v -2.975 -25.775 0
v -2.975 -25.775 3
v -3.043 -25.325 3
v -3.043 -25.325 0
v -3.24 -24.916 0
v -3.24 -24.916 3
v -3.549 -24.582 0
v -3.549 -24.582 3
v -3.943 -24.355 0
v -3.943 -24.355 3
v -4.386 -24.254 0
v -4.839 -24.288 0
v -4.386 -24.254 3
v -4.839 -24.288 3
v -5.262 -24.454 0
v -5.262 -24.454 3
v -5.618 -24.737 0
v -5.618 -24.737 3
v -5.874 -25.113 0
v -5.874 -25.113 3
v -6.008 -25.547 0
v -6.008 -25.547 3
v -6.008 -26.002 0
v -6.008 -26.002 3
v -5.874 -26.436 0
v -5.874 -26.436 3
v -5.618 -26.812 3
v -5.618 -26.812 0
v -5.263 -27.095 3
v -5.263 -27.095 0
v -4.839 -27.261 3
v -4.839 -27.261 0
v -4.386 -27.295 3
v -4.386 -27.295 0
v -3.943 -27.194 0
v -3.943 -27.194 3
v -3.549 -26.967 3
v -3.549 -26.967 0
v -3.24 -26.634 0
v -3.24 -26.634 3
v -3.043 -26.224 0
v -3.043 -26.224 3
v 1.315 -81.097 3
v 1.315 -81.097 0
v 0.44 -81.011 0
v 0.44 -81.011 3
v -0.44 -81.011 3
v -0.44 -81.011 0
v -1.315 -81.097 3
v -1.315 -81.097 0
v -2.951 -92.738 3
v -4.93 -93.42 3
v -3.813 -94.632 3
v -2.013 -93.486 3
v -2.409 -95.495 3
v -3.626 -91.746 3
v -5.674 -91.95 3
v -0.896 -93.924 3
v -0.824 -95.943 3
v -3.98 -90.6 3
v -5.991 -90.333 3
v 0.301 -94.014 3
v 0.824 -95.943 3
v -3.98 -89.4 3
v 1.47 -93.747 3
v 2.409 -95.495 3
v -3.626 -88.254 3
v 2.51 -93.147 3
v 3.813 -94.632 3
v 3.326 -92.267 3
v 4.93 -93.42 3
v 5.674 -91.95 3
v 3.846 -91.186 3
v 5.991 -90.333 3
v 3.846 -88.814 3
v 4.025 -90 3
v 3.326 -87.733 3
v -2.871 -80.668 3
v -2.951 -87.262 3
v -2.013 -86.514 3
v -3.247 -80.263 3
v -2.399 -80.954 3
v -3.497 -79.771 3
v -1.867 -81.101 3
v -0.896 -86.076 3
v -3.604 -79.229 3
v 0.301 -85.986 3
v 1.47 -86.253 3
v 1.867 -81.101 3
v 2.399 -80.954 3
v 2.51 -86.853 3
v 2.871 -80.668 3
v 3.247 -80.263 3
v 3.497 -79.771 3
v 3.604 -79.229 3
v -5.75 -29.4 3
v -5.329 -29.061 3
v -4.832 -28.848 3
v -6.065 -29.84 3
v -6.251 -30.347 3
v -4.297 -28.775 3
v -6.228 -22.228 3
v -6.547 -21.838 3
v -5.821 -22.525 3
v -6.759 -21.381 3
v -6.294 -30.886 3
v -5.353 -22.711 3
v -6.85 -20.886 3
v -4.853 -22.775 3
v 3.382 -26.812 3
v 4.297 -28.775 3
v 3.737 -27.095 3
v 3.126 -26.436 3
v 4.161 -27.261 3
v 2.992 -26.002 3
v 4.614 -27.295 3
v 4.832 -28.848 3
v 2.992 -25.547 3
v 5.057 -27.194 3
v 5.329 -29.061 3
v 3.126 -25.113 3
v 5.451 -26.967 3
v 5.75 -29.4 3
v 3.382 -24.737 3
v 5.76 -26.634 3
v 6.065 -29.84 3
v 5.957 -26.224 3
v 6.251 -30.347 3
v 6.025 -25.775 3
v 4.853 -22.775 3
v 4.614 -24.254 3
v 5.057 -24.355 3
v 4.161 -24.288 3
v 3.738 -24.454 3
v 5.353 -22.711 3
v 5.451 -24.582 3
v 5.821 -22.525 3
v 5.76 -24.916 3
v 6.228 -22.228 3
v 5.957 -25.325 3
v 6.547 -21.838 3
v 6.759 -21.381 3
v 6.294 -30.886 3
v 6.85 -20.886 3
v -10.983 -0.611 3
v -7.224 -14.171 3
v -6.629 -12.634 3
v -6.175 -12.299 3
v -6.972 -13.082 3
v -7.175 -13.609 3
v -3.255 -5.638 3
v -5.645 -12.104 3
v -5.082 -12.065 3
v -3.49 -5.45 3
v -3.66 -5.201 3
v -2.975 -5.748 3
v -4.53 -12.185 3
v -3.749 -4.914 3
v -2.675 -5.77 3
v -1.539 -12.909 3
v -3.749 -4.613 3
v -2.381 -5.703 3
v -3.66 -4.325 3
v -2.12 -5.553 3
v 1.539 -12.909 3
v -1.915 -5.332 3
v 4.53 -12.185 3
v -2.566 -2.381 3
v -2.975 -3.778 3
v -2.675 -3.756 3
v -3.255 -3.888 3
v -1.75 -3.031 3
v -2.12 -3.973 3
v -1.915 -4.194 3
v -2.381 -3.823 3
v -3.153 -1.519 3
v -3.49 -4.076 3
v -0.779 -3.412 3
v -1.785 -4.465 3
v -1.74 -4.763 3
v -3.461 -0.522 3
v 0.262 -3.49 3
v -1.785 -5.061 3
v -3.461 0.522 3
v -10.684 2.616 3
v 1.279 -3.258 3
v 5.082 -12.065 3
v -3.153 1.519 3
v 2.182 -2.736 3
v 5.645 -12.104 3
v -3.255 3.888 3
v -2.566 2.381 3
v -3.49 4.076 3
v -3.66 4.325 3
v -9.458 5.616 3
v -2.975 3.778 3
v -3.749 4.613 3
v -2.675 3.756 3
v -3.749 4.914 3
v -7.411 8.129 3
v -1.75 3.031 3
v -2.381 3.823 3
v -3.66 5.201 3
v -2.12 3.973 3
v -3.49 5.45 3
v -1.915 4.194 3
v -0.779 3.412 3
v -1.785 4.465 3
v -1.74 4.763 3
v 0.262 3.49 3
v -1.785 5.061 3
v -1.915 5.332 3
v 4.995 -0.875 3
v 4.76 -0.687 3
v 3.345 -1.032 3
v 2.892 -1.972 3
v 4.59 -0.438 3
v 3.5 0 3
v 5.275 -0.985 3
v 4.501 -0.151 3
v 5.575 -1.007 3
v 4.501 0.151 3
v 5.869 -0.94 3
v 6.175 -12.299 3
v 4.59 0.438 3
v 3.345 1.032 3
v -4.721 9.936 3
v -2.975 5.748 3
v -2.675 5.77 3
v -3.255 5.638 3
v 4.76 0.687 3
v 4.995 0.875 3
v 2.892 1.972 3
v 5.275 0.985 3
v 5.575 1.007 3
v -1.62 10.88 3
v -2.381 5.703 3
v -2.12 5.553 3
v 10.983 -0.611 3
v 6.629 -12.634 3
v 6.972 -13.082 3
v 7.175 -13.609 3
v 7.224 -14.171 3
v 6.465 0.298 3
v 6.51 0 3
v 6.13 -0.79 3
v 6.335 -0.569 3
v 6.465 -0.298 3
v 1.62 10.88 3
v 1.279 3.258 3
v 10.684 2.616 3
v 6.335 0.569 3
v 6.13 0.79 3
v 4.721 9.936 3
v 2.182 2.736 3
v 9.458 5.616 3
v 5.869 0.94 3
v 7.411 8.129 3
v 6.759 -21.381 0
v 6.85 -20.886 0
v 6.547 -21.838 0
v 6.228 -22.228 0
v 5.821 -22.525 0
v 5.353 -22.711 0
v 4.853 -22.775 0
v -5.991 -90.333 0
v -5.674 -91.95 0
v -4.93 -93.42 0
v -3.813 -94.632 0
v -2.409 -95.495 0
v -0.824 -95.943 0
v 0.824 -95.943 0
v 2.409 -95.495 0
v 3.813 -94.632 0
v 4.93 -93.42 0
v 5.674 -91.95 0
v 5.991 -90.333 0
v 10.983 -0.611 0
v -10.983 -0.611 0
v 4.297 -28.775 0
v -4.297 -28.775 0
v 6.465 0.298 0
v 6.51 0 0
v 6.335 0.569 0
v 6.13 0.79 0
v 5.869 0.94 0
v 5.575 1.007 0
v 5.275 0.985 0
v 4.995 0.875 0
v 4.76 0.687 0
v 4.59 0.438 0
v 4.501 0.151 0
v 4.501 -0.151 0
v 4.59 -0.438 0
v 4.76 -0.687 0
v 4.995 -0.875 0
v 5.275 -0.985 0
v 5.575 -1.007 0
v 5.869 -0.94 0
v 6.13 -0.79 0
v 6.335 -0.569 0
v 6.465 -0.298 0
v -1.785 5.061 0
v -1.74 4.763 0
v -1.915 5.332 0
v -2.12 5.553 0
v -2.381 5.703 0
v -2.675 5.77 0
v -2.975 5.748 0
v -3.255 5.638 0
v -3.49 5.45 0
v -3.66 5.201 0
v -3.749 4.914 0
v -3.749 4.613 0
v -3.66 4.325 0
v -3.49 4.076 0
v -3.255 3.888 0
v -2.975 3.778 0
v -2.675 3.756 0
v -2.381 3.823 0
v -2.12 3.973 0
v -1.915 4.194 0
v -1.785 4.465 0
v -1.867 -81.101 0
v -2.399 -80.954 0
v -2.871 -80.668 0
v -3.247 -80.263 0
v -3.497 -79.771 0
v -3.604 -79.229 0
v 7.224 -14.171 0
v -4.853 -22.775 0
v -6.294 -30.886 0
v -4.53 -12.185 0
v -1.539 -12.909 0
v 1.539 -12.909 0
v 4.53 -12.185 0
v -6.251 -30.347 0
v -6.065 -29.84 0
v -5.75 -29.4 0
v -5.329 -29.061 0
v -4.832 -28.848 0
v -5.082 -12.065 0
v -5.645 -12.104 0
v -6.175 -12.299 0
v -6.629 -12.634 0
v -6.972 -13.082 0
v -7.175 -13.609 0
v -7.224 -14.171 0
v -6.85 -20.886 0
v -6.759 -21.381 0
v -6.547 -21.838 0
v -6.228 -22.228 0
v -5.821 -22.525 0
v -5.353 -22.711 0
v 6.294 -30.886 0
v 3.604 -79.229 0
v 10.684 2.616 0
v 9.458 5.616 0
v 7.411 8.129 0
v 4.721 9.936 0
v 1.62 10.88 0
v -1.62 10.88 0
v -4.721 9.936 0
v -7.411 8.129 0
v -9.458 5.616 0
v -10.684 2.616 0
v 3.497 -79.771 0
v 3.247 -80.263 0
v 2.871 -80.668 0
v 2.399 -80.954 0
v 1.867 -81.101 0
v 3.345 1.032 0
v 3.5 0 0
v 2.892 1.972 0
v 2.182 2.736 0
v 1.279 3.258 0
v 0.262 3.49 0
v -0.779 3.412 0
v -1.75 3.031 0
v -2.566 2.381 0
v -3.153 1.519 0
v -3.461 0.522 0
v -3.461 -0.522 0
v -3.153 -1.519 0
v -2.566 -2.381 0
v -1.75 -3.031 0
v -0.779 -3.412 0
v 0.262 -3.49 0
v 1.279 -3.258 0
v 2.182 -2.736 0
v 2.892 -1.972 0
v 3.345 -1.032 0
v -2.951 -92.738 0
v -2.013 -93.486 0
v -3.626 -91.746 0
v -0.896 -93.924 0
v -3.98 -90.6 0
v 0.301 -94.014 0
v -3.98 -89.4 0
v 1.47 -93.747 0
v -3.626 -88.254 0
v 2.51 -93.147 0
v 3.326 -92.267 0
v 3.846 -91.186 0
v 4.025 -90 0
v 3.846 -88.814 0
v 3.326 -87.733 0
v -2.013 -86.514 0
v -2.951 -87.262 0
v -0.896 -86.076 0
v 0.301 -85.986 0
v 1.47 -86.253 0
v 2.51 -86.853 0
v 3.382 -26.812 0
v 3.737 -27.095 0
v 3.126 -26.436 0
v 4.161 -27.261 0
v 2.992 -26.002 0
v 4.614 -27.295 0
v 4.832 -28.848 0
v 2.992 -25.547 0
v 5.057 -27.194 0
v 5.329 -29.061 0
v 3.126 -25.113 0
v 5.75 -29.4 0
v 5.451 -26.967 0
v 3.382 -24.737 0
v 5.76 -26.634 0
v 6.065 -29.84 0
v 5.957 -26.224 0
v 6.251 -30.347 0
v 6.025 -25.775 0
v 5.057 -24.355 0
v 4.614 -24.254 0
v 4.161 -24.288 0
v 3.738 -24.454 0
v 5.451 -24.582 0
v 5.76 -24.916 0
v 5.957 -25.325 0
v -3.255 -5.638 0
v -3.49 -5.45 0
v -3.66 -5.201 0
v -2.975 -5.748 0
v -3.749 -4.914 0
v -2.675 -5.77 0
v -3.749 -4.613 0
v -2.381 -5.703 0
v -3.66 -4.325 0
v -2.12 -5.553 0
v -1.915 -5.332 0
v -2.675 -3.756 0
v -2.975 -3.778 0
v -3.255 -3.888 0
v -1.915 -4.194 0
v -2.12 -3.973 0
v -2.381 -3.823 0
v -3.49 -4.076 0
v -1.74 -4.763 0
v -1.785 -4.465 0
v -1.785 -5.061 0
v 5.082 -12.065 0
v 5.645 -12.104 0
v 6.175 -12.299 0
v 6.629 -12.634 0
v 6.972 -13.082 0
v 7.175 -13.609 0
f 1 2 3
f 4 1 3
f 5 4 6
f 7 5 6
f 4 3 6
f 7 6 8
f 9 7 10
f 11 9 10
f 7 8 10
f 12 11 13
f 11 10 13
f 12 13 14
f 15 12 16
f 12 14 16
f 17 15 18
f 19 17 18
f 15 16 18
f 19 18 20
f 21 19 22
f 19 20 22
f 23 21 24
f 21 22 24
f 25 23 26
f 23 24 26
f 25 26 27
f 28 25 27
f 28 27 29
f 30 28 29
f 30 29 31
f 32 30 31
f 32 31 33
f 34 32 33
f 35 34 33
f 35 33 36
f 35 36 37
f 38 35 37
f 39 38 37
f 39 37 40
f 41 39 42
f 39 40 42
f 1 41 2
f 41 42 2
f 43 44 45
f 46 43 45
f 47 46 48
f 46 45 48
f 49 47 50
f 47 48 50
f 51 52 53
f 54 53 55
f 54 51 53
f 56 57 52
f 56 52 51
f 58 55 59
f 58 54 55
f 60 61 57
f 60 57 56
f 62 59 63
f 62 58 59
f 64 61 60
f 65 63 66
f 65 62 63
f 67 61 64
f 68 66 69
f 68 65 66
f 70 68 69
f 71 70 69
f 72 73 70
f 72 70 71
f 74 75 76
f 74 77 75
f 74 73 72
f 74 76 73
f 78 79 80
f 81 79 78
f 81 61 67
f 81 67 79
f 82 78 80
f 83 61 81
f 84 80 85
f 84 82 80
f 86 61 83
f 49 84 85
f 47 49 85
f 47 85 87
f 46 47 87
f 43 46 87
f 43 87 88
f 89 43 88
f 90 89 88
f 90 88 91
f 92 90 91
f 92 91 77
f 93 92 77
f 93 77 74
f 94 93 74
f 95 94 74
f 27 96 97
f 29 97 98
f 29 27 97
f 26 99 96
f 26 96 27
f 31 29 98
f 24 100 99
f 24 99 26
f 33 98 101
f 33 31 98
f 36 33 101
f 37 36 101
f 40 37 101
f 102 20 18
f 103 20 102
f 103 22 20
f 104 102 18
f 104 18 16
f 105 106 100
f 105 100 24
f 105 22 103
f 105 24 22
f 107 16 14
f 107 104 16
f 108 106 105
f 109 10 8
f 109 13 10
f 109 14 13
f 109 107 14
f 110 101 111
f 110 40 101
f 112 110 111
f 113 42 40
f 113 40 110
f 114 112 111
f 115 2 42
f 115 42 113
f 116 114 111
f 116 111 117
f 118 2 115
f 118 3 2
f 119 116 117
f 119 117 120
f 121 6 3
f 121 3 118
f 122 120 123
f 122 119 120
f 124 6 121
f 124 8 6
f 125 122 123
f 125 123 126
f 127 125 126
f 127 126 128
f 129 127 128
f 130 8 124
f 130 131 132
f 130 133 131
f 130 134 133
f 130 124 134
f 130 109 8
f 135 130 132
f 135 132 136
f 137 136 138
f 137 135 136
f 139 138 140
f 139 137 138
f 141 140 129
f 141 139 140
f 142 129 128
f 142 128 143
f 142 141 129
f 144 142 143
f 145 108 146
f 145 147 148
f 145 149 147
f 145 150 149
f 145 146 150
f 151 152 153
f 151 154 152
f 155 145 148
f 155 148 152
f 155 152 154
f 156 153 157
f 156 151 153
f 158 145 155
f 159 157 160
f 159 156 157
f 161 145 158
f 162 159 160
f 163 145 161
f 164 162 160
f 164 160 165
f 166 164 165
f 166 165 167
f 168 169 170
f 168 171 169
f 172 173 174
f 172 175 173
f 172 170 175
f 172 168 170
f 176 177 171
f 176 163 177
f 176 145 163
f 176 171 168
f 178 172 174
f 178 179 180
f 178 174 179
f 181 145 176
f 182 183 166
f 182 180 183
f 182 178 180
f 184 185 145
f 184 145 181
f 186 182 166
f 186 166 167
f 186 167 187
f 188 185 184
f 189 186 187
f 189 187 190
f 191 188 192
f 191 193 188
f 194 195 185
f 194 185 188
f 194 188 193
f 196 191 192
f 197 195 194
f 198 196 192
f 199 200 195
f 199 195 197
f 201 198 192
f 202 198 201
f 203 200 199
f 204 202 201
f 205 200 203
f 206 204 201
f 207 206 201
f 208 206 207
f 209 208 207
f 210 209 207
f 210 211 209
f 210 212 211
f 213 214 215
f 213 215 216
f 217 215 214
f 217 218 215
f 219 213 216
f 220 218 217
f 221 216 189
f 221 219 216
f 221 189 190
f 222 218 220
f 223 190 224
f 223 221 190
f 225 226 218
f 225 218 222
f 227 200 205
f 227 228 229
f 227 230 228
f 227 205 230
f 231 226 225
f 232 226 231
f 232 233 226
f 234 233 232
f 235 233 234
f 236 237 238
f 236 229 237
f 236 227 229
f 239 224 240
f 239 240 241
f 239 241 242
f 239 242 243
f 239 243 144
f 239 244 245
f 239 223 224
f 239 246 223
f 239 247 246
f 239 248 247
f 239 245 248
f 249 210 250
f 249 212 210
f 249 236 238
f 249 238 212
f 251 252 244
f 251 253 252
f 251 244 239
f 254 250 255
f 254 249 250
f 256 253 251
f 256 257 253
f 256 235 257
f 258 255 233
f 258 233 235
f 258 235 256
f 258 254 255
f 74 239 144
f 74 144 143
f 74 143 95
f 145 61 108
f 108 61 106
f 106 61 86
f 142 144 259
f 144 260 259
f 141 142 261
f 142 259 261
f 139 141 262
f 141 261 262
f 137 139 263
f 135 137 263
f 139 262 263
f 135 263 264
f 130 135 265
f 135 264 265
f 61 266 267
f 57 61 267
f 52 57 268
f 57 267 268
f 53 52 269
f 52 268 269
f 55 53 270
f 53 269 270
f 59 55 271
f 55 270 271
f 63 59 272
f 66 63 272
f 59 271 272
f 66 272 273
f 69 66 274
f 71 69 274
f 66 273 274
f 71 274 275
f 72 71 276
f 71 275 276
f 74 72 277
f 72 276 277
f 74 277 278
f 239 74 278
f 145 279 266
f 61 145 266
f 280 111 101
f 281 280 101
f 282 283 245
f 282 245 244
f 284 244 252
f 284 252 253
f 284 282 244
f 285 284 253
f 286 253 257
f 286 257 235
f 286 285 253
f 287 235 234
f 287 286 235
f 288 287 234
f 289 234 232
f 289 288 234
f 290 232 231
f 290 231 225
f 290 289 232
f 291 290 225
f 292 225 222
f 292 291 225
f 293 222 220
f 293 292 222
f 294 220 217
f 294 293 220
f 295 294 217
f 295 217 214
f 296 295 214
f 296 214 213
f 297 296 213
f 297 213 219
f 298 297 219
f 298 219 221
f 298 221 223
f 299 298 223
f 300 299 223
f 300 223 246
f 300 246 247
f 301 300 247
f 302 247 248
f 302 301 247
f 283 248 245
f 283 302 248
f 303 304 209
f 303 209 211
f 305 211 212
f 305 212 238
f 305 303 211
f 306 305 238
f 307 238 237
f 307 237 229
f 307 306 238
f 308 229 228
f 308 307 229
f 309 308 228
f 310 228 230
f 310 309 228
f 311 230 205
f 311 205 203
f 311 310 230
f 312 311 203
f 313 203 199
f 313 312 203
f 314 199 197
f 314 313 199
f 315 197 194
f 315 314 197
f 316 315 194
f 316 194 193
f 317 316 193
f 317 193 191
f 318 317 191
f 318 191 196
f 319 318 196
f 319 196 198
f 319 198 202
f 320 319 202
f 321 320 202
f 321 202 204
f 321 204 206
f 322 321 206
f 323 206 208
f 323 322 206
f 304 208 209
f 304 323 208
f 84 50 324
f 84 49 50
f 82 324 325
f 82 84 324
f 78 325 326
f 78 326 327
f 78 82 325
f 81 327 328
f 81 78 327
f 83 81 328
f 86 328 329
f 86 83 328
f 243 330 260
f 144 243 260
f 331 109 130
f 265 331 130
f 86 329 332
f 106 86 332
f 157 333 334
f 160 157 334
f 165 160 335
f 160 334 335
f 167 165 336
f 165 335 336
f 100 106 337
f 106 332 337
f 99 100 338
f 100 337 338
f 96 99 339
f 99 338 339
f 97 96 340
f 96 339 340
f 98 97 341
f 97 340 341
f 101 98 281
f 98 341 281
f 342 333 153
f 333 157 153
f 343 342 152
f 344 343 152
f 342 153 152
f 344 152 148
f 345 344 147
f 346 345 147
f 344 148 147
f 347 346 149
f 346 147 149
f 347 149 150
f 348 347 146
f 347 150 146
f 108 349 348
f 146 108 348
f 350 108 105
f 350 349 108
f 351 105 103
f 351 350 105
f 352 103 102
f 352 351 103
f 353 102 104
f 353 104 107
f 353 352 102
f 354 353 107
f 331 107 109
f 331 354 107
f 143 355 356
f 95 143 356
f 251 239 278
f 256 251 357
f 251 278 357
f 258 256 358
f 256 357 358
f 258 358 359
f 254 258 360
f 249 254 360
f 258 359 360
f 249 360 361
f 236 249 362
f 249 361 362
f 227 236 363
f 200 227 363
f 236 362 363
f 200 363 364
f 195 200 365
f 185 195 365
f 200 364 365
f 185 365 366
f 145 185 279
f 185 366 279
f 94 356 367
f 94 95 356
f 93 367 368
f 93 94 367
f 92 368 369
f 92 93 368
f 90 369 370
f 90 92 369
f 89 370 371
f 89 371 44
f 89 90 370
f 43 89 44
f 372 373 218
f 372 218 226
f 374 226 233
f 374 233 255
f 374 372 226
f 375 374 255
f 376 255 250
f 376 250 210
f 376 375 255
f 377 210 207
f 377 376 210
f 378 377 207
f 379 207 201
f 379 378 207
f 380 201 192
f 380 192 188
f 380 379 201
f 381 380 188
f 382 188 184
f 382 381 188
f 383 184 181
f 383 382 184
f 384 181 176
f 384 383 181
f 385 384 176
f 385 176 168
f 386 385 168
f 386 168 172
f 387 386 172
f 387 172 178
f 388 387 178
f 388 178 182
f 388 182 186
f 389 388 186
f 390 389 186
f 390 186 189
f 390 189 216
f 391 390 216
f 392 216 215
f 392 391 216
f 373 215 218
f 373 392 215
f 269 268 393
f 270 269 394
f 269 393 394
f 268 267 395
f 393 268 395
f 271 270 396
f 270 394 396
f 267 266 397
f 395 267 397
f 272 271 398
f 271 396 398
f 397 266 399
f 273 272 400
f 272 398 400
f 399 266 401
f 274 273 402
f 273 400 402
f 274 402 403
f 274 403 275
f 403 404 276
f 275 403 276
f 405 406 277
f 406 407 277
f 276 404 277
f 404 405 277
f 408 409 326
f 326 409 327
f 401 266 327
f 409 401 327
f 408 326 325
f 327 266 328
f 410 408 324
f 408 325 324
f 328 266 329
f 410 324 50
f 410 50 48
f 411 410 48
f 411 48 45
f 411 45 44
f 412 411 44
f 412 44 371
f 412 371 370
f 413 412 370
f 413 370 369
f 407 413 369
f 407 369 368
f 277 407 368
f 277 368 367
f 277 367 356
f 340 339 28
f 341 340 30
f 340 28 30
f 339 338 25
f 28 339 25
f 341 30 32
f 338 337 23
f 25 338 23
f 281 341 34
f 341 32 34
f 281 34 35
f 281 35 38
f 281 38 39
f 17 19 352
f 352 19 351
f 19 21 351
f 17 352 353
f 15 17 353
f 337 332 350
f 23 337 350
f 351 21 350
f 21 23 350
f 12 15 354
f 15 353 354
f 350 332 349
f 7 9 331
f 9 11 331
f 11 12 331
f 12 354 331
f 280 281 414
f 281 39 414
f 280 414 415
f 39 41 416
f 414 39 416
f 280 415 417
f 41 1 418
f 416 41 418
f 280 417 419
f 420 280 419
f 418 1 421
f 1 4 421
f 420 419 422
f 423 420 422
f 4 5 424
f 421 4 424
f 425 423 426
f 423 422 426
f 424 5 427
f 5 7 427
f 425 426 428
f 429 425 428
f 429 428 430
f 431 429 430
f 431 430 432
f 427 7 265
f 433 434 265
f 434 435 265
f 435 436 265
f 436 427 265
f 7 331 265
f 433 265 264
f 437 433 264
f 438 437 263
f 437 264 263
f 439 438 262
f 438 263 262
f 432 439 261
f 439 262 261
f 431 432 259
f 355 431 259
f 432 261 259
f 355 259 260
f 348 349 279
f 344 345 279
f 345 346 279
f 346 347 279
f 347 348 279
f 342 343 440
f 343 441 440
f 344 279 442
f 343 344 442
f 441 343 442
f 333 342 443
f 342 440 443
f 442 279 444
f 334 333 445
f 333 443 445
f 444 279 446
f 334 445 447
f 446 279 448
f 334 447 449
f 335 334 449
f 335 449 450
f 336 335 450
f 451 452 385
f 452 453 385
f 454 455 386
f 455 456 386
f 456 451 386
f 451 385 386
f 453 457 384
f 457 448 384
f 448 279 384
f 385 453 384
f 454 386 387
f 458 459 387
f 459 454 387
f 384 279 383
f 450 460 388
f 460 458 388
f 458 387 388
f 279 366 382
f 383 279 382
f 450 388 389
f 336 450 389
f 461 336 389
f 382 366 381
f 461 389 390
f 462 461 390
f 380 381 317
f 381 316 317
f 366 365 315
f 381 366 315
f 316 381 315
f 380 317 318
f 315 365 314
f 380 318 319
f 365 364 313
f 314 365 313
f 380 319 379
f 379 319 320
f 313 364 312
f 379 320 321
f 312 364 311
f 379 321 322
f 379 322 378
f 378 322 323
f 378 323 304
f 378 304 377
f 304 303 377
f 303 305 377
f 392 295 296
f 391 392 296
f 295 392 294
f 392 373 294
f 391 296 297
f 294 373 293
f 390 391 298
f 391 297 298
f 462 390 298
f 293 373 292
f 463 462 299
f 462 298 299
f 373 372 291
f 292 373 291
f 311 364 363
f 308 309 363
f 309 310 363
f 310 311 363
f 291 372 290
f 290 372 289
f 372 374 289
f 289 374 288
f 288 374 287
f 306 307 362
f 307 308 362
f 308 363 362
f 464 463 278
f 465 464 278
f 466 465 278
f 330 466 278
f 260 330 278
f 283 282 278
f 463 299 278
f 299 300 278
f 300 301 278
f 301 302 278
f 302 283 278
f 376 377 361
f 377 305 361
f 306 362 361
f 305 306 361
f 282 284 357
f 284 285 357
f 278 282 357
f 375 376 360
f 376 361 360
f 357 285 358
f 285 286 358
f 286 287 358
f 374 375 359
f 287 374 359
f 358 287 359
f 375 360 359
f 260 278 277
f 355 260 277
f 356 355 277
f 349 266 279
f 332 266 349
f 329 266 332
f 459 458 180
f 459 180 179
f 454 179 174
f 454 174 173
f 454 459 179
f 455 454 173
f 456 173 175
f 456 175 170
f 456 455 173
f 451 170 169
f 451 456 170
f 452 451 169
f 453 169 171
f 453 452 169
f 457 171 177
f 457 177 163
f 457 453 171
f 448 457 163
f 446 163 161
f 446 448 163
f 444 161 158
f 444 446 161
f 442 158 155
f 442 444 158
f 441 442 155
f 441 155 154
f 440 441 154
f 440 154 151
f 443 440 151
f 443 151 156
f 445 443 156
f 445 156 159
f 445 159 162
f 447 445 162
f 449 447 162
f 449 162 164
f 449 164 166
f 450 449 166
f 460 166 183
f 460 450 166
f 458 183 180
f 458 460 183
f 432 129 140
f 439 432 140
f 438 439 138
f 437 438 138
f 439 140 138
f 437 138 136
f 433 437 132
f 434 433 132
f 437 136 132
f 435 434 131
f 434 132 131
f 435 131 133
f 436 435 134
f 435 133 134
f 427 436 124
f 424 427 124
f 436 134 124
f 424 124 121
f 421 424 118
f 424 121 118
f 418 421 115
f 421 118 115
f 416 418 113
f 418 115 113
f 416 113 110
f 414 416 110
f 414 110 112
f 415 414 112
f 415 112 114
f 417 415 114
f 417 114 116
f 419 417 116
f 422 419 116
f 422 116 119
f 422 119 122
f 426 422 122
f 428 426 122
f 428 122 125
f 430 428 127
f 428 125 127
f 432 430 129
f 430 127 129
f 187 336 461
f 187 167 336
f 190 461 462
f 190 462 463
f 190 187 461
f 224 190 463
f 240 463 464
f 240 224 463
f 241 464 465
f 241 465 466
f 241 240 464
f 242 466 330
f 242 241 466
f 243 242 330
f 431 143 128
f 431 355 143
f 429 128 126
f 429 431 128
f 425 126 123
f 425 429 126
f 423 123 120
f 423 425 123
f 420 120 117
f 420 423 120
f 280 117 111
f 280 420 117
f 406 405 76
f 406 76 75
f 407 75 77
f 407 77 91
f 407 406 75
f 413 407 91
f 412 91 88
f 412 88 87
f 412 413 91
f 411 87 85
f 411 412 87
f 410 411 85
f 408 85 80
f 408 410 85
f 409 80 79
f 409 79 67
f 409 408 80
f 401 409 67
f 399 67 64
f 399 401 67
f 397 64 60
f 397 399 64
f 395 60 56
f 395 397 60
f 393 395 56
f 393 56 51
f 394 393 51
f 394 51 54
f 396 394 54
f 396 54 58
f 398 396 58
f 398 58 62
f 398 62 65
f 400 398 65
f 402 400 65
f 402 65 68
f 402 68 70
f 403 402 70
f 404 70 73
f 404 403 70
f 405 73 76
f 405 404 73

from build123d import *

# Parameters (mm, degrees)
SKETCH_1_R      = 11
SKETCH_1_R_2    = 3.5
SKETCH_1_R_3    = 1.01
SKETCH_1_R_4    = 6
SKETCH_1_R_5    = 4.025
EXTRUDE_1_DEPTH = 3
SKETCH_2_R      = 1.525
EXTRUDE_2_DEPTH = 3
FILLET_1_R      = 2


with BuildPart() as part:
    # 草图1 → 凸台-拉伸1 (new body)
    # profile 1 of 3: a face of its own
    with BuildSketch(Plane.XY):
        with BuildLine():
            ThreePointArc((10.983011573, -0.611111111), (0, -11), (-10.983011573, -0.611111111))
            Line((-10.983011573, -0.611111111), (-5.990733585, -90.333333333))
            ThreePointArc((-5.990733585, -90.333333333), (-0.166731054, -84.002317051), (6, -90))
            ThreePointArc((6, -90), (5.997682949, -90.166731054), (5.990733585, -90.333333333))
            Line((5.990733585, -90.333333333), (10.983011573, -0.611111111))
        make_face()
        with BuildLine():
            Line((-3.466771313, -81.694489982), (-7.418369738, -10.675569794))
            ThreePointArc((-7.418369738, -10.675569794), (0, -13), (7.418369738, -10.675569794))
            Line((7.418369738, -10.675569794), (3.466771313, -81.694489982))
            ThreePointArc((3.466771313, -81.694489982), (0, -81), (-3.466771313, -81.694489982))
        make_face(mode=Mode.SUBTRACT)
    # profile 2 of 3: a face of its own
    with BuildSketch(Plane.XY):
        Circle(SKETCH_1_R)
        Circle(SKETCH_1_R_2, mode=Mode.SUBTRACT)
        with Locations((-2.75, 4.763139721)):
            Circle(SKETCH_1_R_3, mode=Mode.SUBTRACT)
        with Locations((-2.75, -4.763139721)):
            Circle(SKETCH_1_R_3, mode=Mode.SUBTRACT)
        with Locations((5.5, 0)):
            Circle(SKETCH_1_R_3, mode=Mode.SUBTRACT)
    # profile 3 of 3: a face of its own
    with BuildSketch(Plane.XY):
        with Locations((0, -90)):
            Circle(SKETCH_1_R_4)
        with Locations((0, -90)):
            Circle(SKETCH_1_R_5, mode=Mode.SUBTRACT)
    extrude(amount=EXTRUDE_1_DEPTH)

    # 草图2 → 凸台-拉伸2 (add)
    with BuildSketch(Plane.XY.offset(3)):
        Polygon((-6.745155967, -22.774702841), (6.745155967, -22.774702841), (6.411307036, -28.774702841), (-6.411307036, -28.774702841), align=None)
        with Locations((-4.5, -25.774702841)):
            Circle(SKETCH_2_R, mode=Mode.SUBTRACT)
        with Locations((4.5, -25.774702841)):
            Circle(SKETCH_2_R, mode=Mode.SUBTRACT)
    extrude(amount=-EXTRUDE_2_DEPTH)

    # 圆角1
    fillet_1_edges = [part.edges().sort_by_distance(p)[0] for p in [
        (7.418369738, -10.675569794, 1.5),
        (-7.418369738, -10.675569794, 1.5),
        (-3.466771313, -81.694489982, 1.5),
        (3.466771313, -81.694489982, 1.5),
        (6.411307036, -28.774702841, 1.5),
        (6.745155967, -22.774702841, 1.5),
        (-6.745155967, -22.774702841, 1.5),
        (-6.411307036, -28.774702841, 1.5),
    ]]
    fillet(fillet_1_edges, radius=FILLET_1_R)


solid = part.part
